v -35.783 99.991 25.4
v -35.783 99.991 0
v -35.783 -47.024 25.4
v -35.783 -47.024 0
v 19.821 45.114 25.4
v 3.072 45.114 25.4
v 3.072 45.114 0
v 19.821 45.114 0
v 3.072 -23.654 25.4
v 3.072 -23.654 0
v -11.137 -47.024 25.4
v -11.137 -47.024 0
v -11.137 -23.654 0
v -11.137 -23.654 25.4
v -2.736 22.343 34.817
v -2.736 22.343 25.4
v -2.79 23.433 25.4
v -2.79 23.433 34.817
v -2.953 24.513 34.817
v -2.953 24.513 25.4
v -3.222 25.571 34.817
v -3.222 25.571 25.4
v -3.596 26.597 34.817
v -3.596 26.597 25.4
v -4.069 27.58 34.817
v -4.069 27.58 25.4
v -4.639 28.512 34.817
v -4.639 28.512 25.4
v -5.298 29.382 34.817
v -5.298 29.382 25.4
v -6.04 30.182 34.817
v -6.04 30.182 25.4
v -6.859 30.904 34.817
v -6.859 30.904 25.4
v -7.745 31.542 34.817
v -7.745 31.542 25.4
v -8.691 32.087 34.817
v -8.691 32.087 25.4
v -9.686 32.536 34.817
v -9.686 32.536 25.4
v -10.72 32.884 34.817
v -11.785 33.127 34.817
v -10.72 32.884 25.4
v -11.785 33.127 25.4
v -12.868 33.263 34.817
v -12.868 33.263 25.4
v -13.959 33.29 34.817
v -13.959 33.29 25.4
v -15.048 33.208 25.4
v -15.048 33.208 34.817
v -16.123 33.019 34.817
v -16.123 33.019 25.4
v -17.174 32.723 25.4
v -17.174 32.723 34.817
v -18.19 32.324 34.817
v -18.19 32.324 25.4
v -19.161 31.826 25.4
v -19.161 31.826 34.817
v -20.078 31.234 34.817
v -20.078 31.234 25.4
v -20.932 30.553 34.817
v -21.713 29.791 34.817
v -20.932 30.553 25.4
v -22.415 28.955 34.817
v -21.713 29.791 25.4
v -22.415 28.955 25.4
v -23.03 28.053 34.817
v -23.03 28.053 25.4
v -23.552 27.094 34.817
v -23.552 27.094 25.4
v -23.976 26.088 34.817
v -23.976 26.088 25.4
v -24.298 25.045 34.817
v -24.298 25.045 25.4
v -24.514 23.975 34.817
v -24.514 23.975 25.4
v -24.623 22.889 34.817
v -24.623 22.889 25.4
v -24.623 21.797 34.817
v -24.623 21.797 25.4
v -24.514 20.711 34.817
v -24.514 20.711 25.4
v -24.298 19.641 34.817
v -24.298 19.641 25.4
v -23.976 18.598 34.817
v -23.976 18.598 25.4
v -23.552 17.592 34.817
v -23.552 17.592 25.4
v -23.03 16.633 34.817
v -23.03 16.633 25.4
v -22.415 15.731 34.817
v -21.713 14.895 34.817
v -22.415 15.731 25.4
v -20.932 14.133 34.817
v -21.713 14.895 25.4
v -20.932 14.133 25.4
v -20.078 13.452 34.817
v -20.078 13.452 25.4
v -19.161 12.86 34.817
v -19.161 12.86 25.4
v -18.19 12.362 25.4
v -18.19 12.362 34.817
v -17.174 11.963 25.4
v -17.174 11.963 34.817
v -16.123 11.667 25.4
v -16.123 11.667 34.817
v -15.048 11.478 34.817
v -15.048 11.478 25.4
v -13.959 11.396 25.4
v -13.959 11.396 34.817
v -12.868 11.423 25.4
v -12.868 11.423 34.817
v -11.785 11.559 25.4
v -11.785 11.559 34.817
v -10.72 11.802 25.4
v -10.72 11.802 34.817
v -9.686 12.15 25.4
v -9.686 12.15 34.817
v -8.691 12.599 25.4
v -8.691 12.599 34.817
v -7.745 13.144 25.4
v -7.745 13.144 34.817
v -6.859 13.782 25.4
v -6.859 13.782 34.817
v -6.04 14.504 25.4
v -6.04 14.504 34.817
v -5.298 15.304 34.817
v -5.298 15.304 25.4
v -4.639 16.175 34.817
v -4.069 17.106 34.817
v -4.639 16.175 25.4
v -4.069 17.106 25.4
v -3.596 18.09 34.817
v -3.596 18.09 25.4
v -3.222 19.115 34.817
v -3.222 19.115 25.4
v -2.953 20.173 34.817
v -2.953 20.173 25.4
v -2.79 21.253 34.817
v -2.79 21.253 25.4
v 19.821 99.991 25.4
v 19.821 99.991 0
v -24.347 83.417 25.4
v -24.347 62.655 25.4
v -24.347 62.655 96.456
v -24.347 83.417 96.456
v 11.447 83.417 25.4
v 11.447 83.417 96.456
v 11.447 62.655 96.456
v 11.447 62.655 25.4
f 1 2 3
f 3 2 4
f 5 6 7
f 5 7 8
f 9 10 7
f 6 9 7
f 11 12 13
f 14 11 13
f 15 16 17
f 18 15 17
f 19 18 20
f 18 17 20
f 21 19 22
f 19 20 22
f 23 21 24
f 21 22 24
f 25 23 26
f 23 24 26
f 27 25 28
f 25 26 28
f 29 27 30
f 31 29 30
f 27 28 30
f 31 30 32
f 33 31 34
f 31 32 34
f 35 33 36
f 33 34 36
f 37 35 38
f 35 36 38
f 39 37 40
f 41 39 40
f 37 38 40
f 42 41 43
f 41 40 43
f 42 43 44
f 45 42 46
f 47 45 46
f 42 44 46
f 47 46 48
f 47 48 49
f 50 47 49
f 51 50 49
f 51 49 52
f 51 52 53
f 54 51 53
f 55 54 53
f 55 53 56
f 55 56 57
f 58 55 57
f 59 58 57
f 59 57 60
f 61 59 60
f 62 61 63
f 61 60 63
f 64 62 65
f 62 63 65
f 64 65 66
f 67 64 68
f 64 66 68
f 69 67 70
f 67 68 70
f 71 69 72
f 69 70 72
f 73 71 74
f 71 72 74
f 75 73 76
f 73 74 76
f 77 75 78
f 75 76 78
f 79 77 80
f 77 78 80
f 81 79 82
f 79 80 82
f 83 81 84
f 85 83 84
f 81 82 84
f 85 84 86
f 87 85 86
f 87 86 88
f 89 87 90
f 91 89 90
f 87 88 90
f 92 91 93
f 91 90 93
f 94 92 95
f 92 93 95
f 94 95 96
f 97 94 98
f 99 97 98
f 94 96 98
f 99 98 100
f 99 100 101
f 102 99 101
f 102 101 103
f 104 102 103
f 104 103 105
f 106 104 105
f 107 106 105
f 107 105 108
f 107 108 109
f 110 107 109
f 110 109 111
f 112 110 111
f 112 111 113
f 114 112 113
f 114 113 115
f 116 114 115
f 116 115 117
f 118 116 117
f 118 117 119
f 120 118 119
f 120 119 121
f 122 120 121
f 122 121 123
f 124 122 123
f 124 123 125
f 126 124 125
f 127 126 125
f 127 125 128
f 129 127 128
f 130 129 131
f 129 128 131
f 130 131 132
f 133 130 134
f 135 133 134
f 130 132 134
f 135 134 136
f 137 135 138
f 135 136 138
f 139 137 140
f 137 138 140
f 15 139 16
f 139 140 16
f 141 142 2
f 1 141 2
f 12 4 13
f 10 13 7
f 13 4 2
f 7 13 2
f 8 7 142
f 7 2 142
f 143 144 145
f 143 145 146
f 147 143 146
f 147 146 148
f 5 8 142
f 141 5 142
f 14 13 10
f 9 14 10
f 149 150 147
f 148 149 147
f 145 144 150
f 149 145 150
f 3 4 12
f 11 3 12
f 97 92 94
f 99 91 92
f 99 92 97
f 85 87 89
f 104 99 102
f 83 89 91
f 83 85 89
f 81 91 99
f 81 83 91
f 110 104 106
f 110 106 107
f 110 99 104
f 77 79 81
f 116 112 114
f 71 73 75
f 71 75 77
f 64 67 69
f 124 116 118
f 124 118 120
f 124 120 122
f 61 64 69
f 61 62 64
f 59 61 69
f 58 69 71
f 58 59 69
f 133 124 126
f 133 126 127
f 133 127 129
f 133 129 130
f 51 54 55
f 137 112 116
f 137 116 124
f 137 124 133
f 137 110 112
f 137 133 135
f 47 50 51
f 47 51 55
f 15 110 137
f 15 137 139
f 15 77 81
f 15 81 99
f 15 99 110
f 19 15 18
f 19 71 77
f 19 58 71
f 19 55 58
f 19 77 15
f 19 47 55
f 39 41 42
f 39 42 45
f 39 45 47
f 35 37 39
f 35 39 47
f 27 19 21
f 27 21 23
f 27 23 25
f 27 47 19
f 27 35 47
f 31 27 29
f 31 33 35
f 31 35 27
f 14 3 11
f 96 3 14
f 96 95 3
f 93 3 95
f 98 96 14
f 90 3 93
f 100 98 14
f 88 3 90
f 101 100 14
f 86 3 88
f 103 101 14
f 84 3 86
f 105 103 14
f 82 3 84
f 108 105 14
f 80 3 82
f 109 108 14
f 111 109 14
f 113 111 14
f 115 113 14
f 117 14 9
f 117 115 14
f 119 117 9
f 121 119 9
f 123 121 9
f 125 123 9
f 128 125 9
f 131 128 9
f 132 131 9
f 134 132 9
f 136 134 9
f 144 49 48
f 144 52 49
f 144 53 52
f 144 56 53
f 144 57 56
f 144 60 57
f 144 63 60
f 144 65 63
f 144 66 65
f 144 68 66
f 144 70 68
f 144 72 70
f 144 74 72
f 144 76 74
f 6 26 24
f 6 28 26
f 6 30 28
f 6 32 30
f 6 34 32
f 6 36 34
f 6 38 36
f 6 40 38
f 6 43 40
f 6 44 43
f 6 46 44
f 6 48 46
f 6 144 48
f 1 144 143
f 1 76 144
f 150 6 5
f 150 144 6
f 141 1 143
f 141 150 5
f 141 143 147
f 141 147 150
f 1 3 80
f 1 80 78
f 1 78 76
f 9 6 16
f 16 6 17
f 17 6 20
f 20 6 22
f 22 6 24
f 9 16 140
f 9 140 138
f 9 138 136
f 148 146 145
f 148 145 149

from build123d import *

# Parameters (mm, degrees)
F0_W     = 14.2082790844
F0_H     = 68.7680318952
F0_W_2   = 16.8297942728
F1_DEPTH = 25.4
F2_R     = 10.9503541364
F3_DEPTH = 9.4174239784
F5_W     = 35.7930406462
F5_H     = 20.7620039582
F6_DEPTH = 71.0562486202


with BuildPart() as f1:
    # F0 (on Top) → F1 (new body)
    with BuildSketch(Plane.XY):
        Polygon((3.0717435293, 45.1143532991), (19.8212694377, 45.1143532991), (19.8212694377, 99.9910533428), (-35.7833579183, 99.9910533428), (-35.7833579183, 72.552703321), (-11.1365355551, 72.552703321), (-11.1365355551, 45.1143532991), align=None)
        with Locations((-4.0323960129, 10.7303373516)):
            Rectangle(F0_W, F0_H)
        with Locations((-19.5514326915, 10.7303373516)):
            Rectangle(F0_W_2, F0_H)
        Polygon((-27.9663298279, 45.1143532991), (-11.1365355551, 45.1143532991), (-11.1365355551, 72.552703321), (-35.7833579183, 72.552703321), (-35.7833579183, 45.1143532991), align=None)
        Polygon((-27.9663298279, -23.653678596), (-27.9663298279, 45.1143532991), (-35.7833579183, 45.1143532991), (-35.7833579183, 0), (-35.7833579183, -47.0235422254), (-11.1365355551, -47.0235422254), (-11.1365355551, -23.653678596), align=None)
    extrude(amount=F1_DEPTH)

    # F2 (on face) → F3 (join)
    with BuildSketch(Plane.XY.offset(25.4)):
        with Locations((-13.6862043291, 22.343069315)):
            Circle(F2_R)
    extrude(amount=F3_DEPTH)

    # F5 (on face) → F6 (join)
    with BuildSketch(Plane.XY.offset(25.4)):
        with Locations((-6.4500138396, 73.0364732444)):
            Rectangle(F5_W, F5_H)
    extrude(amount=F6_DEPTH)


solid = f1.part
